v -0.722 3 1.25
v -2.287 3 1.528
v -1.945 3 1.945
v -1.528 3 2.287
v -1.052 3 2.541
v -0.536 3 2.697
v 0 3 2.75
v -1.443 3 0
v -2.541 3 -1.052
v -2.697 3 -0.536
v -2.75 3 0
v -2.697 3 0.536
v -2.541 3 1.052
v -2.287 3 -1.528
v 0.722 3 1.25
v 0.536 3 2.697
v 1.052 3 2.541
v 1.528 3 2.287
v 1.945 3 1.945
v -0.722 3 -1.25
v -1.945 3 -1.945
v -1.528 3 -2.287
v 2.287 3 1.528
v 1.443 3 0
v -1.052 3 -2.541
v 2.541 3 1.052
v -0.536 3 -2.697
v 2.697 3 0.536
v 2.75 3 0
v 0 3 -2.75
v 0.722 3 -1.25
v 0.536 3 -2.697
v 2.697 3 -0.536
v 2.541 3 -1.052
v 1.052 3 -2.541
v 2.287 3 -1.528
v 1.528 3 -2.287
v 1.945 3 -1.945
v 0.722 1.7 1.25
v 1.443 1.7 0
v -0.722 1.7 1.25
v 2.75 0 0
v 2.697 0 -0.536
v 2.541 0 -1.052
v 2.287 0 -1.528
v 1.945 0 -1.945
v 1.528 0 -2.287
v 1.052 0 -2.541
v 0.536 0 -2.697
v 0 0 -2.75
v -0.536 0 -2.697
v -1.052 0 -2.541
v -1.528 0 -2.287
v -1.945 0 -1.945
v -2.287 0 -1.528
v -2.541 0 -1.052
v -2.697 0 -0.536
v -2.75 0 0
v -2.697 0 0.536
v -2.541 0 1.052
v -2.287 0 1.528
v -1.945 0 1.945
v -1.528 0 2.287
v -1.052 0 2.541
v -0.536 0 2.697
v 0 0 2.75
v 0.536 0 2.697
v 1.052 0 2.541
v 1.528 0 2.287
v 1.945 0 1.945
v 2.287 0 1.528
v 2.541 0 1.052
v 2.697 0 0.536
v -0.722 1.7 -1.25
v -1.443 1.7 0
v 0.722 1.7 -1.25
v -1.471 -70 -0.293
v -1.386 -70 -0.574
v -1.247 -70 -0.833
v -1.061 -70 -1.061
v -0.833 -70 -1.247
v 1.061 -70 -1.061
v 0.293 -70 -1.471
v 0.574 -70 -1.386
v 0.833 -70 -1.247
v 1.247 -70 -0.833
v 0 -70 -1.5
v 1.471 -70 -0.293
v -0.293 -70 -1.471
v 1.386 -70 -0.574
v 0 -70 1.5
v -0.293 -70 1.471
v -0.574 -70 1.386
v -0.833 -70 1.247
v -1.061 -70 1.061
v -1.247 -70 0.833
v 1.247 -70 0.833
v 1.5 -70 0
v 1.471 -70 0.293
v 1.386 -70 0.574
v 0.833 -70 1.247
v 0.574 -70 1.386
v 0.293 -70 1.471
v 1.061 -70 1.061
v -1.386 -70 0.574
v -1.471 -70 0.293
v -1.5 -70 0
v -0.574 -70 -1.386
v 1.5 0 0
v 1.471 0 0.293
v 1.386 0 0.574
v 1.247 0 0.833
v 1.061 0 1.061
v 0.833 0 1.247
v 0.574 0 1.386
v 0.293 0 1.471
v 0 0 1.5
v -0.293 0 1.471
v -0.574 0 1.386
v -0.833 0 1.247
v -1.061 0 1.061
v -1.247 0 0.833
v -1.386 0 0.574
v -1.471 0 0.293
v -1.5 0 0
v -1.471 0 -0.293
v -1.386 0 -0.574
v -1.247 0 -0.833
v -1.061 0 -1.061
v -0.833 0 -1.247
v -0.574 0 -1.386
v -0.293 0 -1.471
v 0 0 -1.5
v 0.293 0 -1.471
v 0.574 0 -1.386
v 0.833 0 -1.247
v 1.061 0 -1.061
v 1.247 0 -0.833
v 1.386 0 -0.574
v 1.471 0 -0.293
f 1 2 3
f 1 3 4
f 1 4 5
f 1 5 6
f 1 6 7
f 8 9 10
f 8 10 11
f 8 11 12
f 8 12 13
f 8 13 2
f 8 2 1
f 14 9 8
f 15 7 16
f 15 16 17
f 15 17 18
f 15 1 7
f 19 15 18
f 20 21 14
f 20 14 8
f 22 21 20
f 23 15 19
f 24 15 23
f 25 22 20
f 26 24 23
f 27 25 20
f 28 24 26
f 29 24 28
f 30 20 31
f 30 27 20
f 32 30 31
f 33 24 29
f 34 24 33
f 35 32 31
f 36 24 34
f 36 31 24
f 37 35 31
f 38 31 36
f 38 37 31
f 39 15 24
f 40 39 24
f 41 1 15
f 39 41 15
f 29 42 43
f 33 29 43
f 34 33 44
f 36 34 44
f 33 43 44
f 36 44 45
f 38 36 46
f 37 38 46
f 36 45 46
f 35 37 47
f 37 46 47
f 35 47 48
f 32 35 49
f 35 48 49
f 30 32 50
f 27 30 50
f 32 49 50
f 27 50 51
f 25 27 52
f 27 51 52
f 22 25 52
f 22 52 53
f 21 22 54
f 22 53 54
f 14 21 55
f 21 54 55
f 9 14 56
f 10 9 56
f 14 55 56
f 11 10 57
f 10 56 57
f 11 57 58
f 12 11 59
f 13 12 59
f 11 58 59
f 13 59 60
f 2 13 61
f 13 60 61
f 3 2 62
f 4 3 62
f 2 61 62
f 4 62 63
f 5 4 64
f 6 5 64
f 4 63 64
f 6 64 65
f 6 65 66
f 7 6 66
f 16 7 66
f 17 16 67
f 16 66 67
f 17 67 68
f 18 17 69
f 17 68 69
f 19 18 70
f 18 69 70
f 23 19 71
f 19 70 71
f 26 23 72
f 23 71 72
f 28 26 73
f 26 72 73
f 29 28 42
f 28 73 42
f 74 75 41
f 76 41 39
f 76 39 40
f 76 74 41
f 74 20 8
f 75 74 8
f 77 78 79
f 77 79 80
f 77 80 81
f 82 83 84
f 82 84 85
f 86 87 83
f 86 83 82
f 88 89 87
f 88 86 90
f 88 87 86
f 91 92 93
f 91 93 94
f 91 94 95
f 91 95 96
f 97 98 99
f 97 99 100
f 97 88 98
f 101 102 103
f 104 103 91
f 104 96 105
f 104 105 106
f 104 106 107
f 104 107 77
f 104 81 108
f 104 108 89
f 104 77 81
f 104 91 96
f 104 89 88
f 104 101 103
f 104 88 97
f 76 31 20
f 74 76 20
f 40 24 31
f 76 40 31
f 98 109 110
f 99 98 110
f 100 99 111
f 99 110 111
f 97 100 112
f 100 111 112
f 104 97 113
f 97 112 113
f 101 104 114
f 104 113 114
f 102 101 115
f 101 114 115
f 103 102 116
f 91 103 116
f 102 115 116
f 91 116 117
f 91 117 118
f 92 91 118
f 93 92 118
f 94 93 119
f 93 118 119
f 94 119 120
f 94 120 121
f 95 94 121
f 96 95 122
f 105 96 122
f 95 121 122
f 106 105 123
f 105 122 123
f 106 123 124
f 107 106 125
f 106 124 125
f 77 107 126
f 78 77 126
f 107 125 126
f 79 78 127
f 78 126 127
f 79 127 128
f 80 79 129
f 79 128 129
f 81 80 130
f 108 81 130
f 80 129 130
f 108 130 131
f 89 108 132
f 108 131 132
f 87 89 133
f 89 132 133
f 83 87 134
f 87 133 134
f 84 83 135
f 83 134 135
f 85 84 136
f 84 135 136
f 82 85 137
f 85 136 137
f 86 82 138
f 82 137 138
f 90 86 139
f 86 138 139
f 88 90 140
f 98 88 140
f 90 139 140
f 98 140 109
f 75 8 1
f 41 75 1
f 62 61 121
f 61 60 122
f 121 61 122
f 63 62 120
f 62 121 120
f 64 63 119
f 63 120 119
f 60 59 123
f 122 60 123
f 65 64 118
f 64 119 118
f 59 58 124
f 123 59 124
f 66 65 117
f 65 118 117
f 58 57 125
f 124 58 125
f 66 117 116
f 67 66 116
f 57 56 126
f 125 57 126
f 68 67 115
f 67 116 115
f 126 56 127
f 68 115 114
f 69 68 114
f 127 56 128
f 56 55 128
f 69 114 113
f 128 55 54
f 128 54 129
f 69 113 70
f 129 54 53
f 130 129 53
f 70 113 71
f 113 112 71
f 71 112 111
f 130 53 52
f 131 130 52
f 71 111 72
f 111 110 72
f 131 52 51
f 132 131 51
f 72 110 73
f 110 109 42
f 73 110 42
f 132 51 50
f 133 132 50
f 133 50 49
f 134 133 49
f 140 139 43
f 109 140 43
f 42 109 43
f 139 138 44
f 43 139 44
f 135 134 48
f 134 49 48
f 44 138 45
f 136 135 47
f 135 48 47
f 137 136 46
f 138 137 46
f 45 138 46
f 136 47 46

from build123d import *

# Parameters (mm, degrees)
SKETCH_1_R            = 2.75
EXTRUDE_248_DEPTH     = 3
CUT_EXTRUDE_378_DEPTH = 1.3
SKETCH_3_R            = 1.5
EXTRUDE_479_DEPTH     = 70


with BuildPart() as part:
    # 草图1 → Extrude 248 (new body)
    with BuildSketch(Plane(origin=(0, 0, 0), x_dir=(1, 0, 0), z_dir=(0, 1, 0))):
        Circle(SKETCH_1_R)
    extrude(amount=EXTRUDE_248_DEPTH)

    # 草图2 → Cut-Extrude 378 (cut)
    with BuildSketch(Plane(origin=(0, 3, 0), x_dir=(1, 0, 0), z_dir=(0, 1, 0))):
        Polygon((1.443375673, 0), (0.721687836, 1.25), (-0.721687836, 1.25), (-1.443375673, 0), (-0.721687836, -1.25), (0.721687836, -1.25), align=None)
    extrude(amount=-CUT_EXTRUDE_378_DEPTH, mode=Mode.SUBTRACT)

    # 草图3 → Extrude 479 (add)
    with BuildSketch(Plane.XZ):
        Circle(SKETCH_3_R)
    extrude(amount=EXTRUDE_479_DEPTH)


solid = part.part
